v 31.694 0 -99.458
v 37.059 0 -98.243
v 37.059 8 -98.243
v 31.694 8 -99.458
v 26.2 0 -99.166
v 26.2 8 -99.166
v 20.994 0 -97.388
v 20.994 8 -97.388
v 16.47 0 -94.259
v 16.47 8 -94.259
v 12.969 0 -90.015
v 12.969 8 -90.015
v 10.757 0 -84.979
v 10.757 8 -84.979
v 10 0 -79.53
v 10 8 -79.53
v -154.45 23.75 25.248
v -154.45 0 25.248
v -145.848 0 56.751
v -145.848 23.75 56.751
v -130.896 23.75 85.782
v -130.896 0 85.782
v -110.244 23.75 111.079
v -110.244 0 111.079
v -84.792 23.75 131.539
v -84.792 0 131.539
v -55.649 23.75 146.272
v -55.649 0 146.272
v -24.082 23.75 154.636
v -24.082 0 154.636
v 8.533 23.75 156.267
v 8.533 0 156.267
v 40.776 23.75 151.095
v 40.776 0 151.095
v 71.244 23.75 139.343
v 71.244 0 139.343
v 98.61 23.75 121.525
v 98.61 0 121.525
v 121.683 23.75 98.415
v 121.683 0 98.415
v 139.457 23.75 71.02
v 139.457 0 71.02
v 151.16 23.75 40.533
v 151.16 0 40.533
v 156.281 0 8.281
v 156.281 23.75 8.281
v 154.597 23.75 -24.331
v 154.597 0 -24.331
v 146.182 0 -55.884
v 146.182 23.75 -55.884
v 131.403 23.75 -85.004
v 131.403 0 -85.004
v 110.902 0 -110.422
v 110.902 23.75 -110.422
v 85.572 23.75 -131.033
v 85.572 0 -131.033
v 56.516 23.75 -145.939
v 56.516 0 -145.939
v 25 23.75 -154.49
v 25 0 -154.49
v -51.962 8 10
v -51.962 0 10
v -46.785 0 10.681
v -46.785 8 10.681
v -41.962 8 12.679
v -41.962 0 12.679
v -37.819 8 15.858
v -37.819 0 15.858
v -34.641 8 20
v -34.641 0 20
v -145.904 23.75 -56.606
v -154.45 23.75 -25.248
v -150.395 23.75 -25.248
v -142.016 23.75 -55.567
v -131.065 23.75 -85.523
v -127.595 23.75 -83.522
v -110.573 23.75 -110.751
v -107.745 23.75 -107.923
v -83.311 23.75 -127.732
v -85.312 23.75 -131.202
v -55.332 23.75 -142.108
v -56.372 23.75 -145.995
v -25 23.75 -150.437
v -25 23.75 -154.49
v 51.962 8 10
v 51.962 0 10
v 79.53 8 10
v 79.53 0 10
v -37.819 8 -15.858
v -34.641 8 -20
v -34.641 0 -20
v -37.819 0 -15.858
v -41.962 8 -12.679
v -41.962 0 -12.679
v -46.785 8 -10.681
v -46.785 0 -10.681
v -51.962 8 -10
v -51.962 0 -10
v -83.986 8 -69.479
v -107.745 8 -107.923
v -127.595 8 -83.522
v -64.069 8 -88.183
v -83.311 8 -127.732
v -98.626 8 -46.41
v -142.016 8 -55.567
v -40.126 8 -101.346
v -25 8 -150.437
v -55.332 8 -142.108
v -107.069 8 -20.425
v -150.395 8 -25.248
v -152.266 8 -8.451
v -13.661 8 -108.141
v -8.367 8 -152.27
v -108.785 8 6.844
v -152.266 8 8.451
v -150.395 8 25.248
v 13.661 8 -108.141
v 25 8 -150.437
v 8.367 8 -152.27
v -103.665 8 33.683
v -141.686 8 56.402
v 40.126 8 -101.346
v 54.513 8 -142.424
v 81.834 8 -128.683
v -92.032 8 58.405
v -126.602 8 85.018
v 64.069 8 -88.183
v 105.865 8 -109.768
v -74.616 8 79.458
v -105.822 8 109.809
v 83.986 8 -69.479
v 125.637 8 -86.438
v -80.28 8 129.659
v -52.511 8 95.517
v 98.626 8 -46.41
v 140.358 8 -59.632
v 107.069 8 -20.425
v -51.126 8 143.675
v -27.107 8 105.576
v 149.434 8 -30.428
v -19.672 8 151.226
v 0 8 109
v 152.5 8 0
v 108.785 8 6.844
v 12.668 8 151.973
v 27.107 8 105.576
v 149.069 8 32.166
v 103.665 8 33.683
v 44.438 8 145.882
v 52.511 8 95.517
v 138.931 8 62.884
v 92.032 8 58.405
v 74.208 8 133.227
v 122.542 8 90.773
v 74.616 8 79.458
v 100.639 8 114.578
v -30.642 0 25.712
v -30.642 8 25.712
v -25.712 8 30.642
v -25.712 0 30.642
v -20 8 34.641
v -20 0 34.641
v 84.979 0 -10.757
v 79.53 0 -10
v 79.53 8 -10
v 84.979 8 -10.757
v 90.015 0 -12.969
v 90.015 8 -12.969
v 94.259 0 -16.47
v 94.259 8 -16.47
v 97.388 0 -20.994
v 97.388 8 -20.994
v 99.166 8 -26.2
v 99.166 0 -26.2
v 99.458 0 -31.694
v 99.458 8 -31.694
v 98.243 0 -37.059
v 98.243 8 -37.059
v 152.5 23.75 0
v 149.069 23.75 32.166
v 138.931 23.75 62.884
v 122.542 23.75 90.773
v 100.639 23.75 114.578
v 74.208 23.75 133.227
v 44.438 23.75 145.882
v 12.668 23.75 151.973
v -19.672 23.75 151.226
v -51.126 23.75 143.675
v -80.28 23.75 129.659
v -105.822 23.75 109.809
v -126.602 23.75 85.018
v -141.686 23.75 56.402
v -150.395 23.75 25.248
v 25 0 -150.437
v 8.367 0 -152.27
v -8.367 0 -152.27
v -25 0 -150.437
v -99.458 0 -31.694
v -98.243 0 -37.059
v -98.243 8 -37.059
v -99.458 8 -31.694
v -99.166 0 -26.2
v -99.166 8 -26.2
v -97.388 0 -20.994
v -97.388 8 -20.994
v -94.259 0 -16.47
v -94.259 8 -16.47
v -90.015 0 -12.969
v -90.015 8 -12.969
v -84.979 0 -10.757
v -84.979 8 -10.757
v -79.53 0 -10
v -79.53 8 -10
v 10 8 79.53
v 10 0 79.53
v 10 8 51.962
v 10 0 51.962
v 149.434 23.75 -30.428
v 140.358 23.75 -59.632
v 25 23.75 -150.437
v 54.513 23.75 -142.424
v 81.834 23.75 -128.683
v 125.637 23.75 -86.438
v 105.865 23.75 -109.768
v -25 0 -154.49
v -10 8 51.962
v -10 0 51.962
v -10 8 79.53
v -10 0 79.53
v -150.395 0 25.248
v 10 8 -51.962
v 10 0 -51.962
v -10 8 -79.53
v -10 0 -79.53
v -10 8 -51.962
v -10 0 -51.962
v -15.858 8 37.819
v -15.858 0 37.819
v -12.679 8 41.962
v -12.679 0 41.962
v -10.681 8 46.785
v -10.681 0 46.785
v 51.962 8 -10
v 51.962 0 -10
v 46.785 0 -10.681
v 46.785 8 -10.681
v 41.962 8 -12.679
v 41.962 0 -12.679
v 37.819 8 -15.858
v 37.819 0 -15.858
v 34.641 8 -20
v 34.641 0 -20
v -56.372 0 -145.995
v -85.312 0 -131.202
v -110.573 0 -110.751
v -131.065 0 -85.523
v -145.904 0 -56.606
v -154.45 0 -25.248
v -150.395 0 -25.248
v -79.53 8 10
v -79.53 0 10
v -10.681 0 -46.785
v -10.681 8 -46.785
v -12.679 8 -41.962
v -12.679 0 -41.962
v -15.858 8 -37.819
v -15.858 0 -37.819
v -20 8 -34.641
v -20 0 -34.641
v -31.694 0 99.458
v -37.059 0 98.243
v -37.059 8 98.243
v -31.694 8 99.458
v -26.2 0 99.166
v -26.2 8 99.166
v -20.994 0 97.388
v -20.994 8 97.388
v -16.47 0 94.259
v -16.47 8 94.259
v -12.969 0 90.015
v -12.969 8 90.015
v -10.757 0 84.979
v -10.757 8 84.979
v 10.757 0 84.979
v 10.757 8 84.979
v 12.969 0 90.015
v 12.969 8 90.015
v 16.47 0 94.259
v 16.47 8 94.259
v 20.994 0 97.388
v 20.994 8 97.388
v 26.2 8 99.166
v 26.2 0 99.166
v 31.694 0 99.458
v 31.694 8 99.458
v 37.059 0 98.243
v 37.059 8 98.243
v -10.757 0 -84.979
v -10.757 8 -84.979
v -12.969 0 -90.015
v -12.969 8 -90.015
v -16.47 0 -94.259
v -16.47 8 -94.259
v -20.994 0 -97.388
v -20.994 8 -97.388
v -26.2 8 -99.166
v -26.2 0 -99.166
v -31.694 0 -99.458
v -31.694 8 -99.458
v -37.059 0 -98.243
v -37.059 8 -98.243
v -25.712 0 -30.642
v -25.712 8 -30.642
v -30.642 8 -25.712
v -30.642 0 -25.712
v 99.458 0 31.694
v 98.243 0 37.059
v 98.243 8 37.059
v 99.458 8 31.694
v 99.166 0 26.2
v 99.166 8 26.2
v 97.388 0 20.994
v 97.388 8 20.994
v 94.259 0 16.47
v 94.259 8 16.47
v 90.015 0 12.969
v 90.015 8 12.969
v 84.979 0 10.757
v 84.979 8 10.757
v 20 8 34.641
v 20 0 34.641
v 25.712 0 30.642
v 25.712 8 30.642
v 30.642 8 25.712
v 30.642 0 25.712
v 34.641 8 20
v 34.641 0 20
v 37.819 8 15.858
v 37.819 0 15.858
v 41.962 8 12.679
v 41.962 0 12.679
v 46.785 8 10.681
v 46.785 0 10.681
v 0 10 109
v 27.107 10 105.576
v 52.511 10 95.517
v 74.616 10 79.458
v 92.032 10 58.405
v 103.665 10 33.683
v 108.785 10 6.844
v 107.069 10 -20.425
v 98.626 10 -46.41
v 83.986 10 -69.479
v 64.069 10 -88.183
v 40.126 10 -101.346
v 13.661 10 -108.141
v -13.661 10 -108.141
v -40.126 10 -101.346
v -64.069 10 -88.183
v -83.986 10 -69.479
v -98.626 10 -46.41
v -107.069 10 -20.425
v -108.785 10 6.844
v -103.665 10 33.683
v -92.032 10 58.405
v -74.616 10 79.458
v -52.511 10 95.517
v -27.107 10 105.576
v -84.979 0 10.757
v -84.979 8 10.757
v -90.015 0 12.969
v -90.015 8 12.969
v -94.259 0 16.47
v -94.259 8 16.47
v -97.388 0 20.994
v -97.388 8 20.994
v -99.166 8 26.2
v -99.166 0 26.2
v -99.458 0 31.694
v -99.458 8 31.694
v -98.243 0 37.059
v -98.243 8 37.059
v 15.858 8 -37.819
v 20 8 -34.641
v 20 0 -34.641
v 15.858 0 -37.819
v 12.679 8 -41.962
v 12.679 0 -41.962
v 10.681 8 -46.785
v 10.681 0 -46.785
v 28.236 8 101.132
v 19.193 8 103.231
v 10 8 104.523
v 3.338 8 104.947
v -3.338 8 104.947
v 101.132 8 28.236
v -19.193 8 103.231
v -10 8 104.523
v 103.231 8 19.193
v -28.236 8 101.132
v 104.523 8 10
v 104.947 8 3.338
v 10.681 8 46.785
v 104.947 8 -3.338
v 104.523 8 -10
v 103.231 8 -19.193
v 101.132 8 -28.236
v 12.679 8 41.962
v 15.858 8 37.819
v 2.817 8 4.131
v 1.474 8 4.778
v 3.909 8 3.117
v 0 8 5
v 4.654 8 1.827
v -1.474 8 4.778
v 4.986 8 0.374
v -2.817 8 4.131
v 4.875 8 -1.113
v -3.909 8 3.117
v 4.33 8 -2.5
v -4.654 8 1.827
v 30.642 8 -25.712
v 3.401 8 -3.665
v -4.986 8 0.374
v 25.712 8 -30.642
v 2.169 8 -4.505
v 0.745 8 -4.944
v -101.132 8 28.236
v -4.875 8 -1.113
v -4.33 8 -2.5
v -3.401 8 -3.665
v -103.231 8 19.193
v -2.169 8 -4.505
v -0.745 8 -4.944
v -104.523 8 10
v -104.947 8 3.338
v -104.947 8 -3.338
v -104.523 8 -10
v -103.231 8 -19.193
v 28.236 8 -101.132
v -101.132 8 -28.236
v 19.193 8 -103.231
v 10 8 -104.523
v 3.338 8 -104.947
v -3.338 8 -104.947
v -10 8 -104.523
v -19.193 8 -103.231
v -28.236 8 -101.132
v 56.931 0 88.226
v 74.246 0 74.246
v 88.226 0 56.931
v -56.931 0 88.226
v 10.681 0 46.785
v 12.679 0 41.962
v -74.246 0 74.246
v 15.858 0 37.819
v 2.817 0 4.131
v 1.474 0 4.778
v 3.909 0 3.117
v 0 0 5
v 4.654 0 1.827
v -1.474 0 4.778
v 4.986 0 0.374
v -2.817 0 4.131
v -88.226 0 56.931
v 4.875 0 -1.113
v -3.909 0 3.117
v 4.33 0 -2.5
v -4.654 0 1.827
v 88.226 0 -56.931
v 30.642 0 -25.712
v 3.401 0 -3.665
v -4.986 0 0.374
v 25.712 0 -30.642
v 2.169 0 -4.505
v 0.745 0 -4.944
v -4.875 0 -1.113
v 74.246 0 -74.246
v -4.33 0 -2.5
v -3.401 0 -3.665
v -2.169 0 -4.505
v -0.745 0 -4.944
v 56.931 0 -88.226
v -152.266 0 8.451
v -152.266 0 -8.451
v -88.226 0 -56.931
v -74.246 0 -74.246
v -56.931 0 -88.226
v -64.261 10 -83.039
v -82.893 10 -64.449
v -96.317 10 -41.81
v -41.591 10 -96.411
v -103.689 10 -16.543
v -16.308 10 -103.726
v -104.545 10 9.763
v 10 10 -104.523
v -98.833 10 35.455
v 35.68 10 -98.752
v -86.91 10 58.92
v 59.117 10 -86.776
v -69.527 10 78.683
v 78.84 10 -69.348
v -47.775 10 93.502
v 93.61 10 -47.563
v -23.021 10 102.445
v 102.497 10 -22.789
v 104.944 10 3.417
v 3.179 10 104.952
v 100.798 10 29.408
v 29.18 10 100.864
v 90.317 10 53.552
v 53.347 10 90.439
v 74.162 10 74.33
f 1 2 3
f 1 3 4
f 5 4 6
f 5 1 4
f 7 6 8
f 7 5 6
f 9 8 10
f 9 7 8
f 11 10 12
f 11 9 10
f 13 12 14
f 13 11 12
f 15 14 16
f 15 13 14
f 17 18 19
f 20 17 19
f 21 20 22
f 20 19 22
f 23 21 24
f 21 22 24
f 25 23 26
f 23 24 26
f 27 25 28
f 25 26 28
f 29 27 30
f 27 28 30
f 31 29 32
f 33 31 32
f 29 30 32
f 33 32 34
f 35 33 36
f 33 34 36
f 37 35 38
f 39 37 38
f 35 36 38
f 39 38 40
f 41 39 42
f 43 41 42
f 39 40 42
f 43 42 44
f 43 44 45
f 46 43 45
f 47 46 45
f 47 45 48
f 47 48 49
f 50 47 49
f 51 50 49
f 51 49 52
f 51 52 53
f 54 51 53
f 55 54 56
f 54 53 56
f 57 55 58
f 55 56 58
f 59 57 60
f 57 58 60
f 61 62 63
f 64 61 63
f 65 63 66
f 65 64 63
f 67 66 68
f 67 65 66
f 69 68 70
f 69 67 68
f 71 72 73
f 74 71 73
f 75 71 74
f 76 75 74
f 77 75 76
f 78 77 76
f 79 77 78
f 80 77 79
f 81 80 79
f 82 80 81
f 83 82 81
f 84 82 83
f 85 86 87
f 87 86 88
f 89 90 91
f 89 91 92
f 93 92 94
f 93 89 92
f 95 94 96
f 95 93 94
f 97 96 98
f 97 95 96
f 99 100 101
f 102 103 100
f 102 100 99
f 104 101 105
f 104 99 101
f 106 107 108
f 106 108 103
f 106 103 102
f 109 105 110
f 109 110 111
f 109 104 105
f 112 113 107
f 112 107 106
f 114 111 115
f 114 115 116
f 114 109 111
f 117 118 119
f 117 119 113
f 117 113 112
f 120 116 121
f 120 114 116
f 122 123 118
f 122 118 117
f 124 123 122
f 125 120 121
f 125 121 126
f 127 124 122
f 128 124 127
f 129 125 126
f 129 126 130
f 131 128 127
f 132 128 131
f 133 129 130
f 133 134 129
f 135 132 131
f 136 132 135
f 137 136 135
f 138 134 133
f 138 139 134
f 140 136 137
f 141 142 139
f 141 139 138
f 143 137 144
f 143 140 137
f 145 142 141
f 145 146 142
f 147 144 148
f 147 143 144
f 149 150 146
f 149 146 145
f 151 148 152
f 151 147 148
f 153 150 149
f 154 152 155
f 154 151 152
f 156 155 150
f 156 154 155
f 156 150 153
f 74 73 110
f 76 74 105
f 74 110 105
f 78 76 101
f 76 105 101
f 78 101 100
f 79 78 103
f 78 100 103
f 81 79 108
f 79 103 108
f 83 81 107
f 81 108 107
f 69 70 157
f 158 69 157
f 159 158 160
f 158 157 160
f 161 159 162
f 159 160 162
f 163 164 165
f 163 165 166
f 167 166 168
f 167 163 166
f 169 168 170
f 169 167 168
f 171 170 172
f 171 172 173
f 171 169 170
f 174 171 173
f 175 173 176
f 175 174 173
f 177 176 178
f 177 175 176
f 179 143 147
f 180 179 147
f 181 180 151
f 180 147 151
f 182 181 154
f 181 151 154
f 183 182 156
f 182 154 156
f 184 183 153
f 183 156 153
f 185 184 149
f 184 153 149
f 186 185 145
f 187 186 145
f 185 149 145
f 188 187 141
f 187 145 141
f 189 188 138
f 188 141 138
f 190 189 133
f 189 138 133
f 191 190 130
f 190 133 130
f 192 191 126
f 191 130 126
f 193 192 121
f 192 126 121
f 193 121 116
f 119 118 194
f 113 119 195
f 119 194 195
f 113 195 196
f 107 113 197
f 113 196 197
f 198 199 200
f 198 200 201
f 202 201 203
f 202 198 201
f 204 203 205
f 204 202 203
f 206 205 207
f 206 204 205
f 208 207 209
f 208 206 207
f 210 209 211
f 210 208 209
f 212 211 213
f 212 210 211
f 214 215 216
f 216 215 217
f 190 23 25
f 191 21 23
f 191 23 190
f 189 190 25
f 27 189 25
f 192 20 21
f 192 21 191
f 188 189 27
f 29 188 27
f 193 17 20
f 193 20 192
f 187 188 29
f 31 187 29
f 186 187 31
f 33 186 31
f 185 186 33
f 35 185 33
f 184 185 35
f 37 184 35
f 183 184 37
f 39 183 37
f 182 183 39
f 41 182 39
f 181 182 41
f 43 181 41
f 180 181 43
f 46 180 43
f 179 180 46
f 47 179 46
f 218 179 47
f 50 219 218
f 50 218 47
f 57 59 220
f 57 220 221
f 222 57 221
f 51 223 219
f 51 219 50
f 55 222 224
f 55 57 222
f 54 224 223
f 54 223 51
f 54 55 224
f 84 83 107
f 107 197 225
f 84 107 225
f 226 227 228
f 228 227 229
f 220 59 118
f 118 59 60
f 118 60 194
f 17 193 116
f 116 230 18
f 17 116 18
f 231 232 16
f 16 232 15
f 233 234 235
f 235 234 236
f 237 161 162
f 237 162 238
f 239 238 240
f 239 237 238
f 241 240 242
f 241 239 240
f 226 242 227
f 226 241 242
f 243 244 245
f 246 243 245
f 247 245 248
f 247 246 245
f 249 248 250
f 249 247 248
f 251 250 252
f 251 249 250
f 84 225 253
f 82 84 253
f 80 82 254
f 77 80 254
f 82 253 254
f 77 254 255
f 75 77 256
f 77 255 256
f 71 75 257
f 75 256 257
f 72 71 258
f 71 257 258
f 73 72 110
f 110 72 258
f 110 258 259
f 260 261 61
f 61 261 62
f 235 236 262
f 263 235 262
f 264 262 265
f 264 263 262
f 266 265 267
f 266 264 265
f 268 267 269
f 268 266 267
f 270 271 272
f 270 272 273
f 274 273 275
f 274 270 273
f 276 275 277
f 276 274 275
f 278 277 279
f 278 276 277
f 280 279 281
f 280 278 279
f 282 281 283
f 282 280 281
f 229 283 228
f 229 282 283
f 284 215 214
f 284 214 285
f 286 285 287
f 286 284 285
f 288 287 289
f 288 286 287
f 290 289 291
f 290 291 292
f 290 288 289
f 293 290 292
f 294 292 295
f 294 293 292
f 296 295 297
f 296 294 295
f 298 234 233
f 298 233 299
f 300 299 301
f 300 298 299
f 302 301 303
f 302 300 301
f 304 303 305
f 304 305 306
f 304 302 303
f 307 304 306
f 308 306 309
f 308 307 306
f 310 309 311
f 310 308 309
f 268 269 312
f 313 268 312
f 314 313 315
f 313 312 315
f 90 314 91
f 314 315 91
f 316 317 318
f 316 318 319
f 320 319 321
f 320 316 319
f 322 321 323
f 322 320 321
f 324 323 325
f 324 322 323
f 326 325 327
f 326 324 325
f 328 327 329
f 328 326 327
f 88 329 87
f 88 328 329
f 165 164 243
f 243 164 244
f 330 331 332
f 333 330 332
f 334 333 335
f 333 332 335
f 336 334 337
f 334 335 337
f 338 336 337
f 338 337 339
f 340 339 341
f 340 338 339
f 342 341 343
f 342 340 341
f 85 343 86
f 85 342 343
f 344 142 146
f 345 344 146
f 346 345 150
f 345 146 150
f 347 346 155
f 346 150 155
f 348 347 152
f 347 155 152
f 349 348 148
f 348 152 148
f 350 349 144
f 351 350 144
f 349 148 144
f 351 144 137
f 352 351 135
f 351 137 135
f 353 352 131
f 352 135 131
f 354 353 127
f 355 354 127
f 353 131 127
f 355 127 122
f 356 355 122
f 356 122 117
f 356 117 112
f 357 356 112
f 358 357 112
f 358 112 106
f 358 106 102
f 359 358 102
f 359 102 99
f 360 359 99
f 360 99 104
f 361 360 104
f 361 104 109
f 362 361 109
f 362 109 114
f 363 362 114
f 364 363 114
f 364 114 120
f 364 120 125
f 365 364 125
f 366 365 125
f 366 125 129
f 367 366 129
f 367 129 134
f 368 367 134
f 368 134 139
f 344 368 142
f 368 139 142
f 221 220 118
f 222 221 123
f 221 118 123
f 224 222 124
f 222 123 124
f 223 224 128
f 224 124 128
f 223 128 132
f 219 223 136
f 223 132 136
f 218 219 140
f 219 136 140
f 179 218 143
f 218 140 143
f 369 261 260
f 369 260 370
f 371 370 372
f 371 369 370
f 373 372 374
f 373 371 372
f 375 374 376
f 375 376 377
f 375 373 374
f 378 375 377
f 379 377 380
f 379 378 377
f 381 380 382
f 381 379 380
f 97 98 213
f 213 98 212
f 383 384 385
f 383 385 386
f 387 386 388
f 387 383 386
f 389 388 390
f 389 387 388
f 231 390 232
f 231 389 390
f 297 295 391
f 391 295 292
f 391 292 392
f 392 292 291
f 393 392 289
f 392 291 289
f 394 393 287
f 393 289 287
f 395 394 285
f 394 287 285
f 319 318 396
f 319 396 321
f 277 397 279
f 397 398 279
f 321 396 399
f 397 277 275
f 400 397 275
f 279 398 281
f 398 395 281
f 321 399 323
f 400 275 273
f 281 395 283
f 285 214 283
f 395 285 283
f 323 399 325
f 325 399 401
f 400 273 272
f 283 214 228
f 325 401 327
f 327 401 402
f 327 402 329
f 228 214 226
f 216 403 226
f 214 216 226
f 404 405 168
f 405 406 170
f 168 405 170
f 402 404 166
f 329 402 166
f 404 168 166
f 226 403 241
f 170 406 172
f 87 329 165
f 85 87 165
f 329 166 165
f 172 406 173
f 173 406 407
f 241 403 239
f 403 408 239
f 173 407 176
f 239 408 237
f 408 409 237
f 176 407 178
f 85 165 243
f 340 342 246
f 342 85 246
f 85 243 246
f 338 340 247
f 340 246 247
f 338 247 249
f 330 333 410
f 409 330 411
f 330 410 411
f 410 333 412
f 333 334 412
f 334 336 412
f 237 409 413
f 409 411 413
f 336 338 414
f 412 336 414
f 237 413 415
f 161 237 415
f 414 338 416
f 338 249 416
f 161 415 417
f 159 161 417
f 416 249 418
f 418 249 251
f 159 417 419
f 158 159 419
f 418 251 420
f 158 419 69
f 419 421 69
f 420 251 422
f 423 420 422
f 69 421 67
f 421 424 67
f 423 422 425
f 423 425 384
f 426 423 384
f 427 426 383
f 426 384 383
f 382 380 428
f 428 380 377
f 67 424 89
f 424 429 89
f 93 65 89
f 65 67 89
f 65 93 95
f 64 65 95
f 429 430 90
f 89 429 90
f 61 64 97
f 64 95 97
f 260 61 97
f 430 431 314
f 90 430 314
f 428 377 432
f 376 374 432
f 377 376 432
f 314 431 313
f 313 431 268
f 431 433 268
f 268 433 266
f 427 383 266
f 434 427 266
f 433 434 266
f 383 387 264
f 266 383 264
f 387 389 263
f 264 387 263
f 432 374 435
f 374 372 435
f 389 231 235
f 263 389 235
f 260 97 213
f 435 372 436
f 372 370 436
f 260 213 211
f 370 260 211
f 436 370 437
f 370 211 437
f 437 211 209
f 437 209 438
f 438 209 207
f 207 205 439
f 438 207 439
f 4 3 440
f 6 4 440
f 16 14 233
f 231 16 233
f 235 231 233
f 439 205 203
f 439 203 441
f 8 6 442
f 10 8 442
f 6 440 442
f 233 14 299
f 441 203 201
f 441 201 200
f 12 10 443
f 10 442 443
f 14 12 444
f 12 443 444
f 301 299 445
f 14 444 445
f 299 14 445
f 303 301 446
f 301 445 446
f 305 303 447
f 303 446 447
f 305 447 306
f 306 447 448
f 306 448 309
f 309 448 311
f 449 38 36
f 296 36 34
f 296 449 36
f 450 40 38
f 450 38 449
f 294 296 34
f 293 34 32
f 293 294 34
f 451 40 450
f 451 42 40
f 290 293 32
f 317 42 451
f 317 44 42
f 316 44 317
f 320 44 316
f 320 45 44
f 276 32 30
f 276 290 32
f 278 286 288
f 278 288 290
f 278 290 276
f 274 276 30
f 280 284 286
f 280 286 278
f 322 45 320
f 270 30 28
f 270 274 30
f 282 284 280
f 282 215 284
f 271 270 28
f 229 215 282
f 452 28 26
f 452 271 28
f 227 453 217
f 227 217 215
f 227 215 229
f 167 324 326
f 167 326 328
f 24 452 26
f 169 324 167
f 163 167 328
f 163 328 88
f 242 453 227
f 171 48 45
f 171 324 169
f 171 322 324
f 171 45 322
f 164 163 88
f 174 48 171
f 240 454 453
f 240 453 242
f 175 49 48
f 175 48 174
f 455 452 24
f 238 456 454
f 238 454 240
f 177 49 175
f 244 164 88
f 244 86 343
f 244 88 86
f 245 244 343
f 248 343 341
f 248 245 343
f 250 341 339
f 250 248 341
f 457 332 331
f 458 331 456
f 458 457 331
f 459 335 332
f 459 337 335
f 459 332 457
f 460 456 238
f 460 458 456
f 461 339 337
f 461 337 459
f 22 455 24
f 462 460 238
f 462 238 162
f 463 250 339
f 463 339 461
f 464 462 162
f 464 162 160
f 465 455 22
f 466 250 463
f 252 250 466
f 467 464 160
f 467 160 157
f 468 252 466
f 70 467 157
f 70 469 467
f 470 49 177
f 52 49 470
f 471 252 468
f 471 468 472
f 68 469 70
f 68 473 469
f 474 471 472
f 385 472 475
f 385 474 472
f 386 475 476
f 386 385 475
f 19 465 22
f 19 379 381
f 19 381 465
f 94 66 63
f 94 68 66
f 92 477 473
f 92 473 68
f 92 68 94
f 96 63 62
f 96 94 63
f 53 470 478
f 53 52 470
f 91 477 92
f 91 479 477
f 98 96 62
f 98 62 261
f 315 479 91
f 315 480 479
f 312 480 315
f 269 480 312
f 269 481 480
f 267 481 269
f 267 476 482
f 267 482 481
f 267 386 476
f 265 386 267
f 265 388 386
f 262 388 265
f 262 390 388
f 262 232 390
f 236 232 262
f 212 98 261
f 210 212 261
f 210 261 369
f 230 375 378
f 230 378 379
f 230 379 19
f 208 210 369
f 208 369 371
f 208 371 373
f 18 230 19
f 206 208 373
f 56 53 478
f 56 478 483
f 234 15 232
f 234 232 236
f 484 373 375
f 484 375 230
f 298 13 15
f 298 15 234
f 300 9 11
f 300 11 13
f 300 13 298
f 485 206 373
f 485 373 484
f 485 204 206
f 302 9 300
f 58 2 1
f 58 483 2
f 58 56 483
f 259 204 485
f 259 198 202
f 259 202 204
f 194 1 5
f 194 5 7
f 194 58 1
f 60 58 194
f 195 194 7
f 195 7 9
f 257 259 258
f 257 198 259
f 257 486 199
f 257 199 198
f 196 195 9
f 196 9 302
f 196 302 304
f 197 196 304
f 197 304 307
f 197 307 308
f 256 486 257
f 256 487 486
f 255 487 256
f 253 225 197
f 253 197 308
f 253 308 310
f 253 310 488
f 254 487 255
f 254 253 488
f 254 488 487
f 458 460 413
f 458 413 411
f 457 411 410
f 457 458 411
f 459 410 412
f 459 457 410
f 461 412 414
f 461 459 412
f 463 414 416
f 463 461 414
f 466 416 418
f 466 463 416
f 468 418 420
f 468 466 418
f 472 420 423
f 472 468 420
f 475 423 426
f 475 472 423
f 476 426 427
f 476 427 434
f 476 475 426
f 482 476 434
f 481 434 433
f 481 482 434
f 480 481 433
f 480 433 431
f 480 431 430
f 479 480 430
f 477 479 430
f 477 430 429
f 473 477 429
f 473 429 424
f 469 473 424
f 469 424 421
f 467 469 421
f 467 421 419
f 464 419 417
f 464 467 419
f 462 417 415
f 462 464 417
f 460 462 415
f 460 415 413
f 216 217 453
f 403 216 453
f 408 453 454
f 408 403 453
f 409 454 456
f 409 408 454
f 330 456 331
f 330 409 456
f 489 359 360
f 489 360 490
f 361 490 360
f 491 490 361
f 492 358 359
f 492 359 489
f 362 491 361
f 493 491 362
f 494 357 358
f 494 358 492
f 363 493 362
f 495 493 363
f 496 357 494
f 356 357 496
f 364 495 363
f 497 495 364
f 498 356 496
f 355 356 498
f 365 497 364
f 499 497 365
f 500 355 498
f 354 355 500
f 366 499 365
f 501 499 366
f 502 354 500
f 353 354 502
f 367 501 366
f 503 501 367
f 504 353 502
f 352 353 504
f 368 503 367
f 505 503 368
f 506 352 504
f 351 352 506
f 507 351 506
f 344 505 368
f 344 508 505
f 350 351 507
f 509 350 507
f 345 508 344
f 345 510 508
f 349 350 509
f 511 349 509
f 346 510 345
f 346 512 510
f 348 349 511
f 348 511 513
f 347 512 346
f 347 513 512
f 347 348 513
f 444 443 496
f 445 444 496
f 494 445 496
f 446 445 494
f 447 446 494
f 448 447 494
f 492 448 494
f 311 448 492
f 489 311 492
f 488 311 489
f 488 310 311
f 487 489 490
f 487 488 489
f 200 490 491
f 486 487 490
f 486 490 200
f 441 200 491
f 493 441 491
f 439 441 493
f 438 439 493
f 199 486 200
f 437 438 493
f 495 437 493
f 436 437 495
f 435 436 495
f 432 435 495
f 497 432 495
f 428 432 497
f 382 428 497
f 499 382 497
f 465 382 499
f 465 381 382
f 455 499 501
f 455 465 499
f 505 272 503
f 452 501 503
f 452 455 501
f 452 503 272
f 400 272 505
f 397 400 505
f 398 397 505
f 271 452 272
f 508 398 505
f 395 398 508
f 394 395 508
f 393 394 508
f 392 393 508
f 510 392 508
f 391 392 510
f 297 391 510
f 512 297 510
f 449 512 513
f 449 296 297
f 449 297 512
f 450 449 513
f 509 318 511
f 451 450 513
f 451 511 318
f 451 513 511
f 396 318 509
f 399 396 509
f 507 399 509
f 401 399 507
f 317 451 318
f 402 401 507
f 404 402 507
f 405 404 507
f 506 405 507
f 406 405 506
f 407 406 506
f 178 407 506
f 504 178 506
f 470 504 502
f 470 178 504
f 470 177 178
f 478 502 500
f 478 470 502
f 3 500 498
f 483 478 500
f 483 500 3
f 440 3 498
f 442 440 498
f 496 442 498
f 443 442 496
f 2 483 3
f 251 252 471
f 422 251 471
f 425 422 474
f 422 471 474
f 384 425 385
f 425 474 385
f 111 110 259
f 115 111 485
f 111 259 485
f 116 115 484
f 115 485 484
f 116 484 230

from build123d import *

# Parameters (mm, degrees)
SKETCH1_R             = 5
BOSS_EXTRUDE3_DEPTH   = 8
SKETCH1_R_2           = 152.5
SKETCH1_R_3           = 109
BOSS_EXTRUDE3_2_DEPTH = 8
BOSS_EXTRUDE4_DEPTH   = 23.75
SKETCH1_9_R           = 109
SKETCH1_9_R_2         = 105
BOSS_EXTRUDE5_DEPTH   = 10
BOSS_EXTRUDE6_DEPTH   = 23.75
BOSS_EXTRUDE7_START   = -8
SKETCH2_R             = 40
SKETCH2_R_2           = 5
BOSS_EXTRUDE7_DEPTH   = 8
FILLET1_R             = 20


with BuildPart() as part:
    # Sketch1 → Boss-Extrude3 (new body)
    with BuildSketch(Plane(origin=(0, 0, 0), x_dir=(1, 0, 0), z_dir=(0, 1, 0))):
        with BuildLine():
            ThreePointArc((10, 104.522724802), (0, 105), (-10, 104.522724802))
            Line((-10, 104.522724802), (-10, 10))
            Line((-10, 10), (-104.522724802, 10))
            ThreePointArc((-104.522724802, 10), (-105, 0), (-104.522724802, -10))
            Line((-104.522724802, -10), (-10, -10))
            Line((-10, -10), (-10, -104.522724802))
            ThreePointArc((-10, -104.522724802), (0, -105), (10, -104.522724802))
            Line((10, -104.522724802), (10, -10))
            Line((10, -10), (104.522724802, -10))
            ThreePointArc((104.522724802, -10), (105, 0), (104.522724802, 10))
            Line((104.522724802, 10), (10, 10))
            Line((10, 10), (10, 104.522724802))
        make_face()
        with Locations(Location((0, 0, 0), (0, 0, 270))):
            Circle(SKETCH1_R, mode=Mode.SUBTRACT)
    extrude(amount=BOSS_EXTRUDE3_DEPTH)



with BuildPart() as body_2:
    # Sketch1 → Boss-Extrude3 2 (new body)
    with BuildSketch(Plane(origin=(0, 0, 0), x_dir=(1, 0, 0), z_dir=(0, 1, 0))):
        with Locations(Location((0, 0, 0), (0, 0, 270))):
            Circle(SKETCH1_R_2)
        with Locations(Location((0, 0, 0), (0, 0, 270))):
            Circle(SKETCH1_R_3, mode=Mode.SUBTRACT)
    extrude(amount=BOSS_EXTRUDE3_2_DEPTH)

    # Sketch1<8> → Boss-Extrude4 (add)
    with BuildSketch(Plane(origin=(0, 0, 0), x_dir=(1, 0, 0), z_dir=(0, 1, 0))):
        with BuildLine():
            Line((25, 154.490290957), (25, 150.436863833))
            ThreePointArc((25, 150.436863833), (116.337332787, 98.599568965), (152.5, 0))
            ThreePointArc((152.5, 0), (12.667954727, -151.972934837), (-150.395382597, -25.248344371))
            Line((-150.395382597, -25.248344371), (-154.44989837, -25.248344371))
            ThreePointArc((-154.44989837, -25.248344371), (110.751132294, -110.573218709), (25, 154.490290957))
        make_face()
    extrude(amount=BOSS_EXTRUDE4_DEPTH)


with BuildPart() as part_1:
    add(part.part)

    add(body_2.part)  # Boss-Extrude5 merges body 2
    # Sketch1<9> → Boss-Extrude5 (add)
    with BuildSketch(Plane(origin=(0, 0, 0), x_dir=(1, 0, 0), z_dir=(0, 1, 0))):
        with Locations(Location((0, 0, 0), (0, 0, 270))):
            Circle(SKETCH1_9_R)
        with Locations(Location((0, 0, 0), (0, 0, 84.5349762))):
            Circle(SKETCH1_9_R_2, mode=Mode.SUBTRACT)
    extrude(amount=BOSS_EXTRUDE5_DEPTH)

    # Sketch1<10> → Boss-Extrude6 (add)
    with BuildSketch(Plane(origin=(0, 0, 0), x_dir=(1, 0, 0), z_dir=(0, 1, 0))):
        with BuildLine():
            ThreePointArc((-150.395382597, 25.248344371), (-107.744727994, 107.922766781), (-25, 150.436863833))
            Line((-25, 150.436863833), (-25, 154.490290957))
            ThreePointArc((-25, 154.490290957), (-110.573218709, 110.751132294), (-154.44989837, 25.248344371))
            Line((-154.44989837, 25.248344371), (-150.395382597, 25.248344371))
        make_face()
    extrude(amount=BOSS_EXTRUDE6_DEPTH)

    # Sketch2 → Boss-Extrude7 (add)
    with BuildSketch(Plane(origin=(0, 8, 0), x_dir=(1, 0, 0), z_dir=(0, 1, 0)).offset(BOSS_EXTRUDE7_START)):
        Circle(SKETCH2_R)
        with Locations(Location((0, 0, 0), (0, 0, 270))):
            Circle(SKETCH2_R_2, mode=Mode.SUBTRACT)
    extrude(amount=BOSS_EXTRUDE7_DEPTH)

    # Fillet1
    # the kernel refuses this fillet: 20 mm, written as the material it adds along each edge
    with BuildSketch(Plane(origin=(-38.729833462, 8, 10), x_dir=(-1, 0, 0), z_dir=(0, -1, 0)), Plane(origin=(10, 8, 38.729833462), x_dir=(0, 0, 1), z_dir=(0, -1, 0)), Plane(origin=(-10, 8, -38.729833462), x_dir=(0, 0, -1), z_dir=(0, -1, 0)), Plane(origin=(38.729833462, 8, -10), x_dir=(1, 0, 0), z_dir=(0, -1, 0))) as fillet1_piece_1:
        with BuildLine():
            CenterArc((13.231690765, -20), FILLET1_R, 90, 60)
            ThreePointArc((-4.088817311, -10), (-1.705241726, -5.138679161), (0, 0))
            Line((0, 0), (13.231690765, 0))
        make_face()
    extrude(amount=8)
    with BuildSketch(Plane(origin=(-38.729833462, 8, -10), x_dir=(-1, 0, 0), z_dir=(0, -1, 0)), Plane(origin=(-10, 8, 38.729833462), x_dir=(0, 0, 1), z_dir=(0, -1, 0)), Plane(origin=(38.729833462, 8, 10), x_dir=(1, 0, 0), z_dir=(0, -1, 0)), Plane(origin=(10, 8, -38.729833462), x_dir=(0, 0, -1), z_dir=(0, -1, 0))) as fillet1_piece_2:
        with BuildLine():
            CenterArc((13.231690765, 20), FILLET1_R, 210, 60)
            ThreePointArc((-4.088817311, 10), (-1.705241726, 5.138679161), (0, 0))
            Line((0, 0), (13.231690765, 0))
        make_face()
    extrude(amount=8)
    with BuildSketch(Plane(origin=(-10, 0, -104.522724802), x_dir=(-0.974109622021504, 0, 0.22607619132744317), z_dir=(0, 1, 0)), Plane(origin=(104.522724802, 0, -10), x_dir=(-0.22607619132744408, 0, -0.9741096220215036), z_dir=(0, 1, 0)), Plane(origin=(10, 0, 104.522724802), x_dir=(0.9741096220215038, 0, -0.2260761913274436), z_dir=(0, 1, 0)), Plane(origin=(-104.522724802, 0, 10), x_dir=(0.22607619132744342, 0, 0.974109622021504), z_dir=(0, 1, 0))) as fillet1_piece_3:
        with BuildLine():
            CenterArc((25.13248218, 19.824257879), FILLET1_R, 166.933829853, 110.667316494)
            Line((5.65028974, 24.345781705), (0, 0))
            ThreePointArc((0, 0), (13.88900331, -0.922646137), (27.77800662, 0))
        make_face()
    extrude(amount=8)
    with BuildSketch(Plane(origin=(10, 0, -104.522724802), x_dir=(0.974109622021504, 0, 0.2260761913274437), z_dir=(0, 1, 0)), Plane(origin=(104.522724802, 0, 10), x_dir=(-0.22607619132744344, 0, 0.9741096220215039), z_dir=(0, 1, 0)), Plane(origin=(-10, 0, 104.522724802), x_dir=(-0.9741096220215041, 0, -0.22607619132744258), z_dir=(0, 1, 0)), Plane(origin=(-104.522724802, 0, -10), x_dir=(0.22607619132744275, 0, -0.9741096220215041), z_dir=(0, 1, 0))) as fillet1_piece_4:
        with BuildLine():
            CenterArc((25.13248218, -19.824257879), FILLET1_R, 82.398853653, 110.667316494)
            Line((5.65028974, -24.345781705), (0, 0))
            ThreePointArc((0, 0), (13.88900331, 0.922646137), (27.77800662, 0))
        make_face()
    extrude(amount=8)


solid = part_1.part
